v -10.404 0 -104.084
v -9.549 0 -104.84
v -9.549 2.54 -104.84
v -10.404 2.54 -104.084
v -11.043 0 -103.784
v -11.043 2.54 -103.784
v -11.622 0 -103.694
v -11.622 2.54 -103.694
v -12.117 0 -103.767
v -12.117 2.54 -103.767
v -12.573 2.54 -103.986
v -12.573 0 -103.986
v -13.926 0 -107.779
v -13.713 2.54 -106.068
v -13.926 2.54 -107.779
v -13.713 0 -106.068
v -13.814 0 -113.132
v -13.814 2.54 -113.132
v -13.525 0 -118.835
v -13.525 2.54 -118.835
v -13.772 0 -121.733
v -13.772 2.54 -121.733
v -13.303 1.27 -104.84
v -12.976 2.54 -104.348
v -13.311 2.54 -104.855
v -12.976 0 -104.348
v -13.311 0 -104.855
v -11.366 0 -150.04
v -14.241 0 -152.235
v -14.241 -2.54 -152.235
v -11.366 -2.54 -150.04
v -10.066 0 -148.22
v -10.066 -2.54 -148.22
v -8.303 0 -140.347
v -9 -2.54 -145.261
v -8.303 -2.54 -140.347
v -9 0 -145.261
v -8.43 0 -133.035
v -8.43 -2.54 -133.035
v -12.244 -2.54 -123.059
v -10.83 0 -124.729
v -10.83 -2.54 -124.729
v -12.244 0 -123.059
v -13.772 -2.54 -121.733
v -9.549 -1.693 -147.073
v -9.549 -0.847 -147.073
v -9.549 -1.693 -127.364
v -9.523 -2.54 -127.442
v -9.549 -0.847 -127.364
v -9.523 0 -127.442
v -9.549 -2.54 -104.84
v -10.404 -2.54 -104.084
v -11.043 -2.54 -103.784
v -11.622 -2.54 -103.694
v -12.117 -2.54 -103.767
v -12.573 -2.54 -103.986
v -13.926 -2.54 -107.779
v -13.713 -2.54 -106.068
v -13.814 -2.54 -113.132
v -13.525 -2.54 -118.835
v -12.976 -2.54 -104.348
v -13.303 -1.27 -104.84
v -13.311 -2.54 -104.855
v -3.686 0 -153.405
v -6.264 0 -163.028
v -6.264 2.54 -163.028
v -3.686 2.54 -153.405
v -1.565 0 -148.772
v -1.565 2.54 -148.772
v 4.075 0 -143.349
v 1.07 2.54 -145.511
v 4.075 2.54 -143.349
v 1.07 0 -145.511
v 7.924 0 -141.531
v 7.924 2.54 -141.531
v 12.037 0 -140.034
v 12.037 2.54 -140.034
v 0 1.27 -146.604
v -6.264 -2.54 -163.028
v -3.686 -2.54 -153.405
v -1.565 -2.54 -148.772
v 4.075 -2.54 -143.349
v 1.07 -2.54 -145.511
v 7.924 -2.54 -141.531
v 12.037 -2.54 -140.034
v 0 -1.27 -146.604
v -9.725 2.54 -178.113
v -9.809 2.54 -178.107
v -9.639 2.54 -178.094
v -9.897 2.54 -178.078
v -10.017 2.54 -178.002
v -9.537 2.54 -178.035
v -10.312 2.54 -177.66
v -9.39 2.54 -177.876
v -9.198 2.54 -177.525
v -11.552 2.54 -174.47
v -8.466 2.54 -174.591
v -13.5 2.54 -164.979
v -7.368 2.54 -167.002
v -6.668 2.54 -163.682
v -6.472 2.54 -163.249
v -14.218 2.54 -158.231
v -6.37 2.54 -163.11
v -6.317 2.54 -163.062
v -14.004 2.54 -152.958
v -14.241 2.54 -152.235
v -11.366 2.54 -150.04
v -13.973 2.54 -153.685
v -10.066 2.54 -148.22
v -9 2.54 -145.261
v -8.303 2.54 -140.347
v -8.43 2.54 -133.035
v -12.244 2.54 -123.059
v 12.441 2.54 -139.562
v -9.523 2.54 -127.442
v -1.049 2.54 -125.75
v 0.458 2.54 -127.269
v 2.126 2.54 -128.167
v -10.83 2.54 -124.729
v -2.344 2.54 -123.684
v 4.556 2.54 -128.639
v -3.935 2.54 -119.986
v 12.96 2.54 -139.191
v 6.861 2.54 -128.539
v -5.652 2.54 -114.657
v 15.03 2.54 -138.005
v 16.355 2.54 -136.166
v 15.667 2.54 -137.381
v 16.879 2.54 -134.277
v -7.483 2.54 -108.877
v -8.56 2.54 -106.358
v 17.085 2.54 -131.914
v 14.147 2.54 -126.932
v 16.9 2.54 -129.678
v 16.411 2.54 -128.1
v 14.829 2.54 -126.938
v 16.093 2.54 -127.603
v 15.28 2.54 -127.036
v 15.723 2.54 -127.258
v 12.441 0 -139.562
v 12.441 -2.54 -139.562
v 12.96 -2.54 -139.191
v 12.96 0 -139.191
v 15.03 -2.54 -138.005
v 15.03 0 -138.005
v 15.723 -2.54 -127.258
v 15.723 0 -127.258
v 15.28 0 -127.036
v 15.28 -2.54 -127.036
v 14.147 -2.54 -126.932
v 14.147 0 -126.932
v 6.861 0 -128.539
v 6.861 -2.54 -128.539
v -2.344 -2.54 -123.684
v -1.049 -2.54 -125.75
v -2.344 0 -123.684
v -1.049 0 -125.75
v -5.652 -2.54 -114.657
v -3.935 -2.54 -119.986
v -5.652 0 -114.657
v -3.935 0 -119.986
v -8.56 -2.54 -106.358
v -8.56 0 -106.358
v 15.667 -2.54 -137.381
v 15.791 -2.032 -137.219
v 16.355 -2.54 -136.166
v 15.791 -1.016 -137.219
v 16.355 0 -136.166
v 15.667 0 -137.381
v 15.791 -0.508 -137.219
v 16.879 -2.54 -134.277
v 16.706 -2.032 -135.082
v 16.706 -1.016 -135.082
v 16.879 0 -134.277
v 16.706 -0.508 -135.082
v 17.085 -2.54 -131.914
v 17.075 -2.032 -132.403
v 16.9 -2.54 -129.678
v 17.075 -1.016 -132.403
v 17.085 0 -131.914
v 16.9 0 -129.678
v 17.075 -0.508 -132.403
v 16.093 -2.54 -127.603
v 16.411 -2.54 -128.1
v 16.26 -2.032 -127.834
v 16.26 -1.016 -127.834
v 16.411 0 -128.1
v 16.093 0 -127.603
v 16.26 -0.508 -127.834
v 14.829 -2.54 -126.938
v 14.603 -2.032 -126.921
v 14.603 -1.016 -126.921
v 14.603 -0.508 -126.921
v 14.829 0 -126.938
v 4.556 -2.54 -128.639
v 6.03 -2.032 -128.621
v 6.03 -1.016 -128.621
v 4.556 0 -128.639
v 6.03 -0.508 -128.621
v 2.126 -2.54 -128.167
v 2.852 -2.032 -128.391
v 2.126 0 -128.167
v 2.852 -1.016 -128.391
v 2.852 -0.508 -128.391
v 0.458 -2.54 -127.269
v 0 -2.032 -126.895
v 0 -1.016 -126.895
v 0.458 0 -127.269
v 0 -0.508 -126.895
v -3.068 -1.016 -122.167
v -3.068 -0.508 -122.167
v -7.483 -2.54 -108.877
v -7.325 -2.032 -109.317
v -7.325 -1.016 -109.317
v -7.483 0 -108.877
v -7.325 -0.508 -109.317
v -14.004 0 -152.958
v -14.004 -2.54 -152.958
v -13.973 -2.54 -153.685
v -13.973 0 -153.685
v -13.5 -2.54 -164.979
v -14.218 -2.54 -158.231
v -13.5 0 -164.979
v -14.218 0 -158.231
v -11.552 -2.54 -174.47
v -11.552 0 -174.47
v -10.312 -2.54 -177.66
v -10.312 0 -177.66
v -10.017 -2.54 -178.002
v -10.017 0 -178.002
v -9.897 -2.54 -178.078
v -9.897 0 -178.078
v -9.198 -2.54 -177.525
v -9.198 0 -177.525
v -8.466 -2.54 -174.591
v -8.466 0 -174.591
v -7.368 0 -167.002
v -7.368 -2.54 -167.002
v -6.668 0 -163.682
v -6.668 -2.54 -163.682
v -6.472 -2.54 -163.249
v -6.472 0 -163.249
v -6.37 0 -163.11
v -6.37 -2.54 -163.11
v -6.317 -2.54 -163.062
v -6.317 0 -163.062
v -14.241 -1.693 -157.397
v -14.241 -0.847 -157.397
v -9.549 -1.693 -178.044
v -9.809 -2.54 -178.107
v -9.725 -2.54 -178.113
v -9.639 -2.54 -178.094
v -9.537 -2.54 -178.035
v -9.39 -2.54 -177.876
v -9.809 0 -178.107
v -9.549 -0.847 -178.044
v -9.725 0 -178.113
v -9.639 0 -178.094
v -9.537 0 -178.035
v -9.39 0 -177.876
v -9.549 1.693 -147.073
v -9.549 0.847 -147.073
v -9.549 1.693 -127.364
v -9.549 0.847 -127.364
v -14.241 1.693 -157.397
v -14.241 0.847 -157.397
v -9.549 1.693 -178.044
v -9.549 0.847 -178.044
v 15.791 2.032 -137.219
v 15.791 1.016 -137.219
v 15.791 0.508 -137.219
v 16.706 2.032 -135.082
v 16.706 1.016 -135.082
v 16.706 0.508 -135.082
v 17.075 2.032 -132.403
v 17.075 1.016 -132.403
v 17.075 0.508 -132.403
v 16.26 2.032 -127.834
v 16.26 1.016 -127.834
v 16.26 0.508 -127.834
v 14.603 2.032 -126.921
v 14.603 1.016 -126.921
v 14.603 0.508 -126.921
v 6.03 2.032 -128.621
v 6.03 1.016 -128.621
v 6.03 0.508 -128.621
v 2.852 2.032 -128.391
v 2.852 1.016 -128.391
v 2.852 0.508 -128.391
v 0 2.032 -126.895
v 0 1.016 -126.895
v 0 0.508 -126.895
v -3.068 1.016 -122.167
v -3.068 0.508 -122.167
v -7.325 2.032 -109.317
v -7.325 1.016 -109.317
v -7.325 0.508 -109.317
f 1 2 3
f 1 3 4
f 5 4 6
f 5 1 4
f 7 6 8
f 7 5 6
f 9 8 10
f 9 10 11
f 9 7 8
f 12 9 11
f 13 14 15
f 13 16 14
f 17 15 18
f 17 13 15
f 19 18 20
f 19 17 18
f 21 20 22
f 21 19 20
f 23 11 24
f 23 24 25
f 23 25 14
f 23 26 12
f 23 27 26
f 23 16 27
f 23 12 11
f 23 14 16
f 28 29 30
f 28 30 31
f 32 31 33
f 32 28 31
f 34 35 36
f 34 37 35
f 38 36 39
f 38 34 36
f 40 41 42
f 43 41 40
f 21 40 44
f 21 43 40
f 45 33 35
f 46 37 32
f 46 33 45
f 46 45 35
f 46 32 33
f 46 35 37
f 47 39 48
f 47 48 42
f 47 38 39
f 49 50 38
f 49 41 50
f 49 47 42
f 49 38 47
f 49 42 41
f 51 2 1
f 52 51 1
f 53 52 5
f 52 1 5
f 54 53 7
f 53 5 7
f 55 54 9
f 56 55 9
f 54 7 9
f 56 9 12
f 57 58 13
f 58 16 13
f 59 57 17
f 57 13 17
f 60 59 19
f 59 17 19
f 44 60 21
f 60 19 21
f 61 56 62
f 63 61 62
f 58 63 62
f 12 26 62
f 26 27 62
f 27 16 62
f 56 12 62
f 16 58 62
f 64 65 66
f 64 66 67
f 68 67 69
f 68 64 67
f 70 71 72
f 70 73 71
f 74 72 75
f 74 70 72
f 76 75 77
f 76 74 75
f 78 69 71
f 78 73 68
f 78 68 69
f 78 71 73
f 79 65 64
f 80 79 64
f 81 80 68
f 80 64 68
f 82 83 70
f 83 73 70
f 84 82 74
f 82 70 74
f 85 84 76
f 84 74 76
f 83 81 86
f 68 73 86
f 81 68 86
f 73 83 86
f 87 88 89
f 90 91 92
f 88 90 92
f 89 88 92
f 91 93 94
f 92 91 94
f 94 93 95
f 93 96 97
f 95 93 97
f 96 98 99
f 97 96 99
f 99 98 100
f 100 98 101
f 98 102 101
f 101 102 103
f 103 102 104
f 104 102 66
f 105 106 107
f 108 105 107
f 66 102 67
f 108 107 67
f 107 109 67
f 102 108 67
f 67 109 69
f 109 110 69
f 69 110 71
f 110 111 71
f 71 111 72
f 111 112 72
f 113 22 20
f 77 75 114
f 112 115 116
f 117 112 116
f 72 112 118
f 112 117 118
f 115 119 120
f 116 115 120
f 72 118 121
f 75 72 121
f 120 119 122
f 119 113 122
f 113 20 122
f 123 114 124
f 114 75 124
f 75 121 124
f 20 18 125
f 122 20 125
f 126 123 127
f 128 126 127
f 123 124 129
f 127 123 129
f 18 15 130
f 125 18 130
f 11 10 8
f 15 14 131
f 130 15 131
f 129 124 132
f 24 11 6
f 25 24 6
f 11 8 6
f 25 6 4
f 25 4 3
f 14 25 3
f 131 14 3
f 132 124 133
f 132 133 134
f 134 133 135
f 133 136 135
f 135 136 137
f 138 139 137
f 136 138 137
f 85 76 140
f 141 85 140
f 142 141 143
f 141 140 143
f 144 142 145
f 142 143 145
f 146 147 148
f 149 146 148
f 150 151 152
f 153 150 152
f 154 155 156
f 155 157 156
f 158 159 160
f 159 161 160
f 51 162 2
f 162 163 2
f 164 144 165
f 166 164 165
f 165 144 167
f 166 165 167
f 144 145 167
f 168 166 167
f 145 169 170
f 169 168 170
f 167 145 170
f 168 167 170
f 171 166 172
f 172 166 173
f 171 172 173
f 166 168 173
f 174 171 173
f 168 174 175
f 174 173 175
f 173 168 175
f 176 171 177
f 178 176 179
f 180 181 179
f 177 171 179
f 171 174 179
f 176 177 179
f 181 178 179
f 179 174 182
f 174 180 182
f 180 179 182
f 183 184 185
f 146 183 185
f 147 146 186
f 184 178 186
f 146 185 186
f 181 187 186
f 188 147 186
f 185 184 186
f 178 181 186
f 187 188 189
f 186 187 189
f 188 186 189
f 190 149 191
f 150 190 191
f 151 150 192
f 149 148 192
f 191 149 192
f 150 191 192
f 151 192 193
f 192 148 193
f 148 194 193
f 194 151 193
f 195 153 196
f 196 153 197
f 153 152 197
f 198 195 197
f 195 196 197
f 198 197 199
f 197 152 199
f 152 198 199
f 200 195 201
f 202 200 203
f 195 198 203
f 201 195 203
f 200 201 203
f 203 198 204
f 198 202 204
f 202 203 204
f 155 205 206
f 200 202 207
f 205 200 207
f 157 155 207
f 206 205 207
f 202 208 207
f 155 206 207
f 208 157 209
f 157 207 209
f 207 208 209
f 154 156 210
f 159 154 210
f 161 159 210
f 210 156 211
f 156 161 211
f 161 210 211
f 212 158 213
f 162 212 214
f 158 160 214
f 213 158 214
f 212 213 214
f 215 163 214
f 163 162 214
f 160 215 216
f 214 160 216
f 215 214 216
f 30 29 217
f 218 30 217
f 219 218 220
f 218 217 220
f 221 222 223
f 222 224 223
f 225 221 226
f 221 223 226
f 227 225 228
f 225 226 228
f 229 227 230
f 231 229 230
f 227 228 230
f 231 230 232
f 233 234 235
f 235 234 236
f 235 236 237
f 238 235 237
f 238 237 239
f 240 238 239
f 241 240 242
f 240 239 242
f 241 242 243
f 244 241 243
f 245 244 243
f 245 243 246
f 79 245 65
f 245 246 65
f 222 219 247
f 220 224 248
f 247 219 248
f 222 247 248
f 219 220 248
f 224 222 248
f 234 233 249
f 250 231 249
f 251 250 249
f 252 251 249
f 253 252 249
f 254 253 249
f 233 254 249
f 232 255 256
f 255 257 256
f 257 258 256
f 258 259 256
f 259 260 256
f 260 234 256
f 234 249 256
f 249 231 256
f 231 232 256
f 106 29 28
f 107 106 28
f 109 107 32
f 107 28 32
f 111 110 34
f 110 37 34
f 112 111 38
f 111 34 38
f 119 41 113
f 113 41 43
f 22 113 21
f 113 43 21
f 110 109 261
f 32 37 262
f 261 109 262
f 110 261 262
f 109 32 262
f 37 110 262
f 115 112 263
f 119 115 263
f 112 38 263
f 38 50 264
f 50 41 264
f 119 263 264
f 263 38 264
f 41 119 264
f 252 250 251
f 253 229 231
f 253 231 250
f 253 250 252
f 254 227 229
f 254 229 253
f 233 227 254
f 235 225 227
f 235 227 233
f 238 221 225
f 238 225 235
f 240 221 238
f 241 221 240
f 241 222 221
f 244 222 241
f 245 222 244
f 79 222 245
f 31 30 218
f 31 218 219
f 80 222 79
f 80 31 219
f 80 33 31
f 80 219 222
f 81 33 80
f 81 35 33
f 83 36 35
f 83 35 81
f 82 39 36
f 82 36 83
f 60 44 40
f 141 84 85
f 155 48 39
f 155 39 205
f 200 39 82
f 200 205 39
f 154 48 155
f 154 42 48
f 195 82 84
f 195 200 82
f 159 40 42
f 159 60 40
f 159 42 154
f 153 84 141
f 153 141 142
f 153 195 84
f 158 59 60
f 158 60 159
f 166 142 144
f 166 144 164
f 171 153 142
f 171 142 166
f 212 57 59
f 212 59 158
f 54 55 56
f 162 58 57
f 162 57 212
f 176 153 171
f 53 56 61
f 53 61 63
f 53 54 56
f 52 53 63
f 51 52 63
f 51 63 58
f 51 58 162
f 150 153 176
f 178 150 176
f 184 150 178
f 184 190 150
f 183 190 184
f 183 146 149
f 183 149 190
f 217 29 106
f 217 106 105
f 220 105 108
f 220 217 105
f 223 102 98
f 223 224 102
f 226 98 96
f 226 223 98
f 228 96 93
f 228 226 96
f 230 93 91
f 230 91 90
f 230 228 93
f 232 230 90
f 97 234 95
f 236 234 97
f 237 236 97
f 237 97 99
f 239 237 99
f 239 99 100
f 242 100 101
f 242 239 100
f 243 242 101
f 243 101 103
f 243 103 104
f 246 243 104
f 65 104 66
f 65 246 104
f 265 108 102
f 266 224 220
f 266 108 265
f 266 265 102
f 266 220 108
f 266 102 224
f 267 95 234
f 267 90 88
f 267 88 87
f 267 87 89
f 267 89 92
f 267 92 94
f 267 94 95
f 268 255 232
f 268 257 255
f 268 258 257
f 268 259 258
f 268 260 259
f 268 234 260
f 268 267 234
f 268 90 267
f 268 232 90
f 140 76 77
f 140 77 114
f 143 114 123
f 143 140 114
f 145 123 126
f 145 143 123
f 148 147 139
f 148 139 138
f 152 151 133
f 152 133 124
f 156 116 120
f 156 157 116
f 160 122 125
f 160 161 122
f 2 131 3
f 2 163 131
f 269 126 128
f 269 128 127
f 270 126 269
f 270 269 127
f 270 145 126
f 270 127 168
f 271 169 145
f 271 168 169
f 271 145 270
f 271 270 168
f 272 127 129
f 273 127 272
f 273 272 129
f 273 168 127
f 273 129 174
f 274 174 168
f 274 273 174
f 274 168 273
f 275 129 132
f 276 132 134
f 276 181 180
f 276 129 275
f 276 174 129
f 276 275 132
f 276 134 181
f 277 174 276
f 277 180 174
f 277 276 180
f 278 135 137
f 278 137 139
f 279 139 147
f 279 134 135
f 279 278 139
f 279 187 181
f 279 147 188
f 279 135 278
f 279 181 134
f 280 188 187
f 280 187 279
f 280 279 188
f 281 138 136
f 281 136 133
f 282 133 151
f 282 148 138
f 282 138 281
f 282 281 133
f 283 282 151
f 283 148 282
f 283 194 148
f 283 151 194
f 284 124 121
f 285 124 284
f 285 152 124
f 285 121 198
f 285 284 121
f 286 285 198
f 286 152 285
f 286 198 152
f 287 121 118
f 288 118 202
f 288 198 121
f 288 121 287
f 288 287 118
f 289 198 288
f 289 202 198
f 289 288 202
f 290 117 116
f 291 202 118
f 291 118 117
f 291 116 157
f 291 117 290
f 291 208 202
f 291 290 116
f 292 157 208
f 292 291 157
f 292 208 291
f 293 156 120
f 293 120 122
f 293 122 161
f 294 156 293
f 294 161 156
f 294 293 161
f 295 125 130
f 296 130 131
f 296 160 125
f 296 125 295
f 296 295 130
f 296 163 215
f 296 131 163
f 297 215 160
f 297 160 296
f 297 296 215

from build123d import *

# Parameters (mm, degrees)
F1_DEPTH = 2.54
F2_DEPTH = 2.54
F3_DEPTH = 2.54
F4_DEPTH = 2.54


with BuildPart() as f1:
    # F0 (on Front) → F1 (new body)
    with BuildSketch(Plane.XZ):
        with BuildLine():
            add(Edge.make_bspline(
                [(12.0368245989, -140.0343775749), (12.7817436042, -138.825704238), (17.3285437732, -138.7305148389), (17.5183625619, -126.1735841215), (11.7175135389, -127.2669296634), (-3.9026672208, -132.3538652132), (-6.1964272485, -108.7279757575), (-9.5489192754, -104.8402190208)],
                knots=[0.7135472902, 0.7135472902, 0.7135472902, 0.7135472902, 0.7531563977, 0.80920713, 0.8468990879, 0.9103607431, 1, 1, 1, 1], degree=3))
            add(Edge.make_bspline(
                [(-9.5489192754, -104.8402190208), (-10.8739006372, -103.3036888296), (-15.9900079322, -103.3564118196), (-12.8356038525, -118.0537414817), (-13.7722184882, -121.7334121466)],
                knots=[0, 0, 0, 0, 0.0354274801, 0.1105949876, 0.1105949876, 0.1105949876, 0.1105949876], degree=3))
            add(Edge.make_bspline(
                [(-14.2414756119, -152.2350162268), (-12.444523763, -151.0988909153), (-7.6271822137, -148.053120005), (-7.903866364, -126.5425730186), (-12.1746572022, -123.0426262266), (-13.7722184882, -121.7334121466)],
                knots=[0, 0, 0, 0, 0.2713456995, 0.7274345793, 1, 1, 1, 1], degree=3))
            add(Edge.make_bspline(
                [(-14.2414756119, -152.2350162268), (-13.6061964372, -153.5442259612), (-15.6236414844, -155.8951076841), (-8.7532027803, -192.6237364148), (-7.5446910656, -163.666418584), (-6.2641329132, -163.027882576)],
                knots=[0.2895348678, 0.2895348678, 0.2895348678, 0.2895348678, 0.3310772514, 0.4152147646, 0.486902563, 0.486902563, 0.486902563, 0.486902563], degree=3))
            add(Edge.make_bspline(
                [(-6.2641329132, -163.027882576), (-4.8277859059, -156.7579891544), (-2.1227933502, -144.9502470535), (7.5161471222, -141.6038450923), (12.0368245989, -140.0343775749)],
                knots=[0, 0, 0, 0, 0.5309985066, 1, 1, 1, 1], degree=3))
        make_face()
    extrude(amount=F1_DEPTH)

    # F2 (add): a face of the model
    f2_faces = [f1.faces().sort_by_distance(p)[0] for p in [
        (-3.237570414, 0, -137.8044704799),
    ]]
    extrude(f2_faces, amount=F2_DEPTH)

    # F0 (on Front) → F3 (join)
    with BuildSketch(Plane.XZ):
        with BuildLine():
            add(Edge.make_bspline(
                [(-14.2414756119, -152.2350162268), (-12.444523763, -151.0988909153), (-7.6271822137, -148.053120005), (-7.903866364, -126.5425730186), (-12.1746572022, -123.0426262266), (-13.7722184882, -121.7334121466)],
                knots=[0, 0, 0, 0, 0.2713456995, 0.7274345793, 1, 1, 1, 1], degree=3))
            add(Edge.make_bspline(
                [(-13.7722184882, -121.7334121466), (-14.2810755508, -123.7325549474), (-18.3332958933, -124.1233164951), (-23.7916045432, -143.2701840119), (-15.1933963316, -150.2732584325), (-14.2414756119, -152.2350162268)],
                knots=[0.1105949876, 0.1105949876, 0.1105949876, 0.1105949876, 0.1514330395, 0.2272865567, 0.2895348678, 0.2895348678, 0.2895348678, 0.2895348678], degree=3))
        make_face()
        with BuildLine():
            add(Edge.make_bspline(
                [(-6.2641329132, -163.027882576), (-5.0730145044, -162.4339446963), (-0.9426731227, -186.0152017533), (16.3331137679, -156.1685880213), (10.6234398374, -142.327674516), (12.0368245989, -140.0343775749)],
                knots=[0.486902563, 0.486902563, 0.486902563, 0.486902563, 0.5535833741, 0.6383942756, 0.7135472902, 0.7135472902, 0.7135472902, 0.7135472902], degree=3))
            add(Edge.make_bspline(
                [(-6.2641329132, -163.027882576), (-4.8277859059, -156.7579891544), (-2.1227933502, -144.9502470535), (7.5161471222, -141.6038450923), (12.0368245989, -140.0343775749)],
                knots=[0, 0, 0, 0, 0.5309985066, 1, 1, 1, 1], degree=3))
        make_face()
    extrude(amount=F3_DEPTH)

    # F0 (on Front) → F4 (cut)
    with BuildSketch(Plane.XZ):
        with BuildLine():
            add(Edge.make_bspline(
                [(-6.2641329132, -163.027882576), (-5.0730145044, -162.4339446963), (-0.9426731227, -186.0152017533), (16.3331137679, -156.1685880213), (10.6234398374, -142.327674516), (12.0368245989, -140.0343775749)],
                knots=[0.486902563, 0.486902563, 0.486902563, 0.486902563, 0.5535833741, 0.6383942756, 0.7135472902, 0.7135472902, 0.7135472902, 0.7135472902], degree=3))
            add(Edge.make_bspline(
                [(-6.2641329132, -163.027882576), (-4.8277859059, -156.7579891544), (-2.1227933502, -144.9502470535), (7.5161471222, -141.6038450923), (12.0368245989, -140.0343775749)],
                knots=[0, 0, 0, 0, 0.5309985066, 1, 1, 1, 1], degree=3))
        make_face()
        with BuildLine():
            add(Edge.make_bspline(
                [(-14.2414756119, -152.2350162268), (-12.444523763, -151.0988909153), (-7.6271822137, -148.053120005), (-7.903866364, -126.5425730186), (-12.1746572022, -123.0426262266), (-13.7722184882, -121.7334121466)],
                knots=[0, 0, 0, 0, 0.2713456995, 0.7274345793, 1, 1, 1, 1], degree=3))
            add(Edge.make_bspline(
                [(-13.7722184882, -121.7334121466), (-14.2810755508, -123.7325549474), (-18.3332958933, -124.1233164951), (-23.7916045432, -143.2701840119), (-15.1933963316, -150.2732584325), (-14.2414756119, -152.2350162268)],
                knots=[0.1105949876, 0.1105949876, 0.1105949876, 0.1105949876, 0.1514330395, 0.2272865567, 0.2895348678, 0.2895348678, 0.2895348678, 0.2895348678], degree=3))
        make_face()
    extrude(amount=F4_DEPTH, mode=Mode.SUBTRACT)


solid = f1.part
